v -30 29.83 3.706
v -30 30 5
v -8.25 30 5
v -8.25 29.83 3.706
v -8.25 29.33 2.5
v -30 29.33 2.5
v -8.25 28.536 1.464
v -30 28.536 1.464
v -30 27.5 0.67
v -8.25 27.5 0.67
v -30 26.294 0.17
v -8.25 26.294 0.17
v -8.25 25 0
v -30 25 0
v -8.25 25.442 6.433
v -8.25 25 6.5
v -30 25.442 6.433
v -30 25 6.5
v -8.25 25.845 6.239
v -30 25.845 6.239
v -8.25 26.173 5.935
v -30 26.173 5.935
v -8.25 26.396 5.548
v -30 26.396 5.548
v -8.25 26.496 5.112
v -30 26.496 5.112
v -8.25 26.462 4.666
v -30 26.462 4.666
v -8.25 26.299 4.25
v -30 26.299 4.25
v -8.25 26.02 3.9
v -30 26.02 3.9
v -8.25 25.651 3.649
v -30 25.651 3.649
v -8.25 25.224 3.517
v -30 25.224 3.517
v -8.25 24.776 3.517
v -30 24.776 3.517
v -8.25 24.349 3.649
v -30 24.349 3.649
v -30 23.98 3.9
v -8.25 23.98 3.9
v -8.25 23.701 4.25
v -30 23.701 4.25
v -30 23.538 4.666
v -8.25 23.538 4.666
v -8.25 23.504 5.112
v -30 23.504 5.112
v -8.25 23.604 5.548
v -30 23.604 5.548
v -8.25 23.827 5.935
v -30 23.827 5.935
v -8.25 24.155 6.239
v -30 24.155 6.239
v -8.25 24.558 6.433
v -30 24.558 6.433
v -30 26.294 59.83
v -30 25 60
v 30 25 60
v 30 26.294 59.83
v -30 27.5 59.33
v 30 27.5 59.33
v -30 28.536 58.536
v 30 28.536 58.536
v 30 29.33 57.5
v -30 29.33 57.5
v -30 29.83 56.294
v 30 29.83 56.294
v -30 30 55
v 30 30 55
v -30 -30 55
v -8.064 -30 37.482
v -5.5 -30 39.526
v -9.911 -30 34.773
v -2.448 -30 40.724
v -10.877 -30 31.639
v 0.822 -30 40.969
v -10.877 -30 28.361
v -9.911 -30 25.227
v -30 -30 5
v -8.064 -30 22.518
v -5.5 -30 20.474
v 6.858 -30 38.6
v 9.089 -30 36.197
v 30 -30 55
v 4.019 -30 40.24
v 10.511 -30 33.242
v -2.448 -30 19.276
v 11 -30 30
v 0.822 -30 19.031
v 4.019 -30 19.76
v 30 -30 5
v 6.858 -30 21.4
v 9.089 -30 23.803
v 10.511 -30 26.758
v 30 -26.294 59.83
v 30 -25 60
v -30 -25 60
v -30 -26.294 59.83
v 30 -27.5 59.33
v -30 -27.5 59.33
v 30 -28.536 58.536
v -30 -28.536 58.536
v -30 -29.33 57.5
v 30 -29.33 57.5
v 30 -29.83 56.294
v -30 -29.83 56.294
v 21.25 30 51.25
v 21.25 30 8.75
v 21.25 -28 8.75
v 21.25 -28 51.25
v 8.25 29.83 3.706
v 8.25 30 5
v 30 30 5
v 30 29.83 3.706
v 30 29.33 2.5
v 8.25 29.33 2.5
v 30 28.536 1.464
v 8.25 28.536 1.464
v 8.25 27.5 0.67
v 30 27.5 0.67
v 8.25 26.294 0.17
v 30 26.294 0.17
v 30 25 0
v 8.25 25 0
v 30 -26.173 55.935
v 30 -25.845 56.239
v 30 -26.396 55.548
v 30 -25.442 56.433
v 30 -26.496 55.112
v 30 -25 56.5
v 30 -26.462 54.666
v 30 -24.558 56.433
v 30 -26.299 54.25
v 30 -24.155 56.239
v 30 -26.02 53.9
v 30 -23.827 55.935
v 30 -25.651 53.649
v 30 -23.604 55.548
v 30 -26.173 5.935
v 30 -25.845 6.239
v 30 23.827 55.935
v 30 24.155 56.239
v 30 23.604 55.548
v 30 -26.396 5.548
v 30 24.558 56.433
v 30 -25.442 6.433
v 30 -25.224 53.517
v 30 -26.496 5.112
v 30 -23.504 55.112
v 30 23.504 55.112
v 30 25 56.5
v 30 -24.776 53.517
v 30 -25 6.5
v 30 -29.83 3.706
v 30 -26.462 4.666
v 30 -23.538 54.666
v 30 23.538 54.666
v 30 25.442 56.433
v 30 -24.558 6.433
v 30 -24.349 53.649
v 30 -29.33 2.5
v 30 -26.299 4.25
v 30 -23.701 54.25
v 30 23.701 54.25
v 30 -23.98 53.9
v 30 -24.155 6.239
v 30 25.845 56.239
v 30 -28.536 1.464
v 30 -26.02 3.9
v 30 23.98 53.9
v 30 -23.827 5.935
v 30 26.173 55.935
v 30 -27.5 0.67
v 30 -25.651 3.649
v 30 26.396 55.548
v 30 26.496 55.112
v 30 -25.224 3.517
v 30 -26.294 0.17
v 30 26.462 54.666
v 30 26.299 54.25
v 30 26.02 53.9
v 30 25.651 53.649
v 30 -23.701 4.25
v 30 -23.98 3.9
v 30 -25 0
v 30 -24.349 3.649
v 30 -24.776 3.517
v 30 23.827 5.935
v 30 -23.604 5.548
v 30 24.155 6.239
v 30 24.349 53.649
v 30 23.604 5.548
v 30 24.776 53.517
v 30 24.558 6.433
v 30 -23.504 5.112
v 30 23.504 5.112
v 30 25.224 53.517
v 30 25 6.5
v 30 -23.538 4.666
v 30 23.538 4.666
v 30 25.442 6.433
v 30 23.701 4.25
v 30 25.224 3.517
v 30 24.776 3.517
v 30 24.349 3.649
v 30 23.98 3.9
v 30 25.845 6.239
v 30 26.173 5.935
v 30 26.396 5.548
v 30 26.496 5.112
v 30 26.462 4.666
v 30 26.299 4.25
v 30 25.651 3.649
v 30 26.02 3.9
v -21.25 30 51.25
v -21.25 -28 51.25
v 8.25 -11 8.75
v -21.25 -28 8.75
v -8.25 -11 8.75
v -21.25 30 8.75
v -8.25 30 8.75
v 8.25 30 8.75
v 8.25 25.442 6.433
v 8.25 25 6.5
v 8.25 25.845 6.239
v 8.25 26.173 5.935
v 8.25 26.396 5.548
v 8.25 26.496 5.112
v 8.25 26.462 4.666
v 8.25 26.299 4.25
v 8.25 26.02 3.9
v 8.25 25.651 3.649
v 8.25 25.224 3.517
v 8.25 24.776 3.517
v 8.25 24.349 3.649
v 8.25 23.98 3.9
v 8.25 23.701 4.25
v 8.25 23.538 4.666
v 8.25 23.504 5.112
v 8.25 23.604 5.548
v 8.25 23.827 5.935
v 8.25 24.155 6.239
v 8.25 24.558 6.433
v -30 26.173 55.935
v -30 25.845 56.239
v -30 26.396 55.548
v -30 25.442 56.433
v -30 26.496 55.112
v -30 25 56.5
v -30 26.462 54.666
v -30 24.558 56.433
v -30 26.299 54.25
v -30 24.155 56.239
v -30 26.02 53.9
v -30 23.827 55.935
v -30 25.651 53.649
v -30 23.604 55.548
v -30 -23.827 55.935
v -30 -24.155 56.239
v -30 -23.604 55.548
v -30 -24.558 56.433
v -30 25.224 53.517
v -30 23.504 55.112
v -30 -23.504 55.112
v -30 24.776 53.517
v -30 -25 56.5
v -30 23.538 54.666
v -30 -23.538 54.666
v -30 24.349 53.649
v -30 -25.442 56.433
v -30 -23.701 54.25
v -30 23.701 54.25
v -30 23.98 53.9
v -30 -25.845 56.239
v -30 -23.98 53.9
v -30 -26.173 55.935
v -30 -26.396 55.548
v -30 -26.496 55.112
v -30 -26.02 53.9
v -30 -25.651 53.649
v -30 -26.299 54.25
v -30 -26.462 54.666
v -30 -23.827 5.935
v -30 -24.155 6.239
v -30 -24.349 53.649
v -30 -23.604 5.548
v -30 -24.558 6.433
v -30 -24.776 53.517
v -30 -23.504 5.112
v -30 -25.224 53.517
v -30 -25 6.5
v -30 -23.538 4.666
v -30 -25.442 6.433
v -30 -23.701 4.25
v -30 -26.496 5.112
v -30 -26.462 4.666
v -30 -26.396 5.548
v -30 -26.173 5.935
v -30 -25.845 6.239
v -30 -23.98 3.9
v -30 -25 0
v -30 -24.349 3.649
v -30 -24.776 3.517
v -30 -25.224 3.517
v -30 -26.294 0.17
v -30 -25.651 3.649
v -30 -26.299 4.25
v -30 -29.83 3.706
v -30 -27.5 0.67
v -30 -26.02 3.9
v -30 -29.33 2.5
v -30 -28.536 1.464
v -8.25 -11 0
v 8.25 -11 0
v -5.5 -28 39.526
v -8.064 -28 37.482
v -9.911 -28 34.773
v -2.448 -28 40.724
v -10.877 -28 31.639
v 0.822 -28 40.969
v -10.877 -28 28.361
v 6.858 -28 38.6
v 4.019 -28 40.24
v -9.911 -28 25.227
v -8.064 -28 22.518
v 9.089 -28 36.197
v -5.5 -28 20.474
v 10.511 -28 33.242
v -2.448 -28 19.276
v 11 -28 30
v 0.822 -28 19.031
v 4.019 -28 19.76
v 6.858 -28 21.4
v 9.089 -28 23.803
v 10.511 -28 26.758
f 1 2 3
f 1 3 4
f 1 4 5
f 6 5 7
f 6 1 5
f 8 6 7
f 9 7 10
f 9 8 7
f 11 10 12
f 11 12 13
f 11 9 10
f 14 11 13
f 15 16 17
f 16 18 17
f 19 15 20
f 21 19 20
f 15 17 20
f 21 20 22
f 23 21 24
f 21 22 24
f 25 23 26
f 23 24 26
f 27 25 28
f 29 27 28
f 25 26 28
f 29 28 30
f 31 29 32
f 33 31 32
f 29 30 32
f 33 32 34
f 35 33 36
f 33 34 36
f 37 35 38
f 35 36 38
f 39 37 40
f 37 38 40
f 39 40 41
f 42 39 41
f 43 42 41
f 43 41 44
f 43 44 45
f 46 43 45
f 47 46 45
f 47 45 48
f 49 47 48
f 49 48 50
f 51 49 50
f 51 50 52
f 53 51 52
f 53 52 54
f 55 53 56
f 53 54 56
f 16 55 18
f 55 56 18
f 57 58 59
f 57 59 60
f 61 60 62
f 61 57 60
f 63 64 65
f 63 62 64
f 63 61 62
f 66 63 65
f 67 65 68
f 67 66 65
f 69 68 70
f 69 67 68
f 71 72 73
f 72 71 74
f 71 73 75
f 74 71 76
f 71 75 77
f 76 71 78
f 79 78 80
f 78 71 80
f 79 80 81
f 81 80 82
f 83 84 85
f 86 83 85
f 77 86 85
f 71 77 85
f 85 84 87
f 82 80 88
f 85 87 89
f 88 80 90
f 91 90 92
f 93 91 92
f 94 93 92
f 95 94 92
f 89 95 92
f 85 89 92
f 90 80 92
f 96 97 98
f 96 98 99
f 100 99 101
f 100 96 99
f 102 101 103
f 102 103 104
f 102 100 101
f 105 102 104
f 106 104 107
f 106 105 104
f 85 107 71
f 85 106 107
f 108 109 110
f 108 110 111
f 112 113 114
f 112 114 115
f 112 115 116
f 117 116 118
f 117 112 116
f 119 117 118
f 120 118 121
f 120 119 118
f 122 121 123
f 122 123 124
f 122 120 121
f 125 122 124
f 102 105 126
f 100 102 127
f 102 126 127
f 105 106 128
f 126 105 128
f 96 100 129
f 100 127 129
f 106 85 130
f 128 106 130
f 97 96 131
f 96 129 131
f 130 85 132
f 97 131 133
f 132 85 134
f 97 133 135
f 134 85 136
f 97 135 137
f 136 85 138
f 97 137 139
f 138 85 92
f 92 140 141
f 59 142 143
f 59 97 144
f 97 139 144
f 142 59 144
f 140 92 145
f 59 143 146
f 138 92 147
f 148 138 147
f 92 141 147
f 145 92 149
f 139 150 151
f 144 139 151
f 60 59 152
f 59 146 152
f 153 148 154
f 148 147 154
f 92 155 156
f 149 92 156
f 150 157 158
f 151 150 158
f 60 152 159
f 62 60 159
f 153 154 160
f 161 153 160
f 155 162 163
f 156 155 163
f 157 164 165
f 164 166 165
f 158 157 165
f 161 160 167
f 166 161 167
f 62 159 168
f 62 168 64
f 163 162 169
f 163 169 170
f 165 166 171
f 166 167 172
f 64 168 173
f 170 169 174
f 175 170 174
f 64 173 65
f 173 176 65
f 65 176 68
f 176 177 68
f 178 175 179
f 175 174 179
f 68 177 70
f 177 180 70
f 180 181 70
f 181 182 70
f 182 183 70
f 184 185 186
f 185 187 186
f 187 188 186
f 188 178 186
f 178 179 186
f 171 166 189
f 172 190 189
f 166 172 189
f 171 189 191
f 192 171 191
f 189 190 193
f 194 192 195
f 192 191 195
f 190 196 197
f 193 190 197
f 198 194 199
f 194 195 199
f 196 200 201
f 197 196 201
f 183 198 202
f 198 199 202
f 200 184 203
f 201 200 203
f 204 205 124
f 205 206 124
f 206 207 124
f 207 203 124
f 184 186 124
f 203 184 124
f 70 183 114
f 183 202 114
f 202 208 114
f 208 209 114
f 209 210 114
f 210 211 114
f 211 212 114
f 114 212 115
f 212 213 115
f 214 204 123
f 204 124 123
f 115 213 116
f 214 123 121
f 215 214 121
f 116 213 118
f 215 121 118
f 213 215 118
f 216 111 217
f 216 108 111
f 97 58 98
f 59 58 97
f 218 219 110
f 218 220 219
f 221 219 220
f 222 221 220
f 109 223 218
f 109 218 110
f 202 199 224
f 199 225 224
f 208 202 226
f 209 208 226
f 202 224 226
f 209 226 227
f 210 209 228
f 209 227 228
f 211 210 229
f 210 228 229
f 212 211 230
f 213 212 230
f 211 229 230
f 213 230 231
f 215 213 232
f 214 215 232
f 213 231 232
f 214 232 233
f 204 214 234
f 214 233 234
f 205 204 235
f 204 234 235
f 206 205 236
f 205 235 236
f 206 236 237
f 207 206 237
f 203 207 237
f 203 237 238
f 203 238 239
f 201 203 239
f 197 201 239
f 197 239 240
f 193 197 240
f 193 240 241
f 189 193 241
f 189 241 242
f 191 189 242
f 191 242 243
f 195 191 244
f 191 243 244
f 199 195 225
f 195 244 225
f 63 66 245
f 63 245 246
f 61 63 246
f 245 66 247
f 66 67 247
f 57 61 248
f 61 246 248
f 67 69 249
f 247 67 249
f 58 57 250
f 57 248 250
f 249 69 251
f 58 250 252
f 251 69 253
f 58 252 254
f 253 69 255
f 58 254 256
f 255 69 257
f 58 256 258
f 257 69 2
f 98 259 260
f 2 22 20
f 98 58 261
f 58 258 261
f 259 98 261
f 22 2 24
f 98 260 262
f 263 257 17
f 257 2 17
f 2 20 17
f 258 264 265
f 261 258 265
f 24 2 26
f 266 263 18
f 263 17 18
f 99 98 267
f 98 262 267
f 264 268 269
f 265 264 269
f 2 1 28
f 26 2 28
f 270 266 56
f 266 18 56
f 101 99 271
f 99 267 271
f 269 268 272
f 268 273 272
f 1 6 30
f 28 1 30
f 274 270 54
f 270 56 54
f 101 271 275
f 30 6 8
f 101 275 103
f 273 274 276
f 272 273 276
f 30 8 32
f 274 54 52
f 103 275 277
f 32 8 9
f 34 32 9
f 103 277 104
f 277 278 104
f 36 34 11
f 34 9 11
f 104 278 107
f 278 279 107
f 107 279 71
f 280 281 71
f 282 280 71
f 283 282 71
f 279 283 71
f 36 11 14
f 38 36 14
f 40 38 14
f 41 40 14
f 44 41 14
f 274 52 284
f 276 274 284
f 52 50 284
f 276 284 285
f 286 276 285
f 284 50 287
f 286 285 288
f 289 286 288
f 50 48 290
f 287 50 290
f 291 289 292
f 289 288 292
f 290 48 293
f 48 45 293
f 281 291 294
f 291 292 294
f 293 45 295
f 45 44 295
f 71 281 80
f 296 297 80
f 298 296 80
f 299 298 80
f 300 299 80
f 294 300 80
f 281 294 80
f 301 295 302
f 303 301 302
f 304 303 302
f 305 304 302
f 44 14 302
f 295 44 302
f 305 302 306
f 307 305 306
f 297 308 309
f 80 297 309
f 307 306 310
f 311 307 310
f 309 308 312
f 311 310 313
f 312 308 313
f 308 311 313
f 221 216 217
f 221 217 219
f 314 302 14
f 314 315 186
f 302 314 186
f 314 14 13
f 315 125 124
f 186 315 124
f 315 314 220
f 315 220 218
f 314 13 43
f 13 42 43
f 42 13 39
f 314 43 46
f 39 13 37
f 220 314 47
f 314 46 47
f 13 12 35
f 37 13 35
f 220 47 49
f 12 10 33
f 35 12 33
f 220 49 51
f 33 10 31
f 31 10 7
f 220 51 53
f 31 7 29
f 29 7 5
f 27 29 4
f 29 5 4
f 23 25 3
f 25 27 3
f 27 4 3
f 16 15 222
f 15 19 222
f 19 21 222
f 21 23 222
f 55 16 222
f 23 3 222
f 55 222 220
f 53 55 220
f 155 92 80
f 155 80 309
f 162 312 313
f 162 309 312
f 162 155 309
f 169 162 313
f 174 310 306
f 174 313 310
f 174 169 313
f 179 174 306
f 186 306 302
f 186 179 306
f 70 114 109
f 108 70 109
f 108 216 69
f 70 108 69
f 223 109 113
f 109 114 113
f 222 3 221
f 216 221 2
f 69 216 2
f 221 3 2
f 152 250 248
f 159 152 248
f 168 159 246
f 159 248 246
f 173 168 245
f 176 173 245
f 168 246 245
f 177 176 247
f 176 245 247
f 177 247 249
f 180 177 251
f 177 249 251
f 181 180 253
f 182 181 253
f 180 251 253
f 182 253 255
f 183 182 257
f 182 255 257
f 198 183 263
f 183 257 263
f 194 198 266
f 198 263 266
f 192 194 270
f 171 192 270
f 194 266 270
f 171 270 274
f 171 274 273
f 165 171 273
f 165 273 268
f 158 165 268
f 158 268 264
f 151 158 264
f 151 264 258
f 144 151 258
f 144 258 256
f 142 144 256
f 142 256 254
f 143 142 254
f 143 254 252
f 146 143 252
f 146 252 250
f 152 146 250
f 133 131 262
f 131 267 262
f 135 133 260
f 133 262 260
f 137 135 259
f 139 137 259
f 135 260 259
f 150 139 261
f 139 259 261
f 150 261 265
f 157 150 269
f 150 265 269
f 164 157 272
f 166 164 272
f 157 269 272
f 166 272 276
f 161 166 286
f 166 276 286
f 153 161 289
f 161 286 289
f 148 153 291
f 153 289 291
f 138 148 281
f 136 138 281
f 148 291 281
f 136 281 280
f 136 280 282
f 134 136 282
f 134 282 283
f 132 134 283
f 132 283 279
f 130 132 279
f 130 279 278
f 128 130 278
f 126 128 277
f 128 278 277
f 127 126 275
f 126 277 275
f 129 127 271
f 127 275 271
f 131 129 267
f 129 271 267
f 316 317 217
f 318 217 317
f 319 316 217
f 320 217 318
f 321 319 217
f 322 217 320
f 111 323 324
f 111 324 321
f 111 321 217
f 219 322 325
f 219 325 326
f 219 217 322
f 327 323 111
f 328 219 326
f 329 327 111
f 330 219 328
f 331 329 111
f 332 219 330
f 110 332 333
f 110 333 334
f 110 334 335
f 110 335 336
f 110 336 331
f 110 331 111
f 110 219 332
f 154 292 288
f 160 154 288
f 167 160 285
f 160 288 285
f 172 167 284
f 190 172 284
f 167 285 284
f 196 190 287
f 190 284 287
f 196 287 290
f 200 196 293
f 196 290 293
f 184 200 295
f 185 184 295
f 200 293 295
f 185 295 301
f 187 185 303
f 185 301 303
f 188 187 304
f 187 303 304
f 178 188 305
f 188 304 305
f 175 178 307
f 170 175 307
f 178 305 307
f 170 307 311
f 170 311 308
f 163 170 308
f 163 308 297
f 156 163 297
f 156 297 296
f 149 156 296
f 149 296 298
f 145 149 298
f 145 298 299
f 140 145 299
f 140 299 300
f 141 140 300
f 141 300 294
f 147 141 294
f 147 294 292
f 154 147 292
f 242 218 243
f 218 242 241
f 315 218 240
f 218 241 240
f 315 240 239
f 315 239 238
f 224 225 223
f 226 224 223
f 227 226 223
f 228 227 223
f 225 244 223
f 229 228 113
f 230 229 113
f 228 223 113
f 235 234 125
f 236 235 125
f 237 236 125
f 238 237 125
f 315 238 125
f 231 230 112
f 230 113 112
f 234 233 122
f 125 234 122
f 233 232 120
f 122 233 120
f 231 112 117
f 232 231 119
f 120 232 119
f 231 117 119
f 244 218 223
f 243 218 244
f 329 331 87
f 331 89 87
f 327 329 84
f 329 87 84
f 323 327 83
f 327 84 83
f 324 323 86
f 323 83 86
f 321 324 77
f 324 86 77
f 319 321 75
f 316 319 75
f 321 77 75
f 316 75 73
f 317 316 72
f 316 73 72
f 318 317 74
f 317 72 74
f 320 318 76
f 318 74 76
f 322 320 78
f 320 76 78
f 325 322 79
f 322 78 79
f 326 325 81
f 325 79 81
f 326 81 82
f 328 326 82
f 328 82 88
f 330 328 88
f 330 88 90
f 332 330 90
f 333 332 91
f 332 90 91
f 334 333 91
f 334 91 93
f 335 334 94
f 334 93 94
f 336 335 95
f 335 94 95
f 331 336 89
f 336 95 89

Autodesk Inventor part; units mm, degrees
ref_plane "YZ Plane" through (0, 0, 0) normal (1, 0, 0) x (0, 1, 0)
ref_plane "XZ Plane" through (0, 0, 0) normal (0, 1, 0) x (-1, 0, 0)
ref_plane "XY Plane" through (0, 0, 0) normal (0, 0, 1) x (1, 0, 0)
sketch "Sketch1" plane through (0, 0, 0) normal (0, 0, 1) x (1, 0, 0)
  line L0 (-30, -30) -> (30, -30)
  line L1 (30, -30) -> (30, 30)
  line L2 (30, 30) -> (-30, 30)
  line L3 (-30, 30) -> (-30, -30)
  line L4 (-30, -30) -> (30, 30) construction
  line L5 (30, -30) -> (-30, 30) construction
  point P0 (0, 0)
  dimension "d0" = 60
  dimension "d1" = 60
extrude "Main Block" add sketch "Sketch1" along normal blind 60
sketch "Sketch2" plane through (-30, 30, 0) normal (0, 1, 0) x (1, 0, 0)
  line L0 (0, -60) -> (60, -60) construction
  line L1 (0, 0) -> (60, 0) construction
  line L2 (60, -60) -> (0, 0) construction
  line L3 (51.25, -51.25) -> (8.75, -51.25)
  line L4 (8.75, -51.25) -> (8.75, -8.75)
  line L5 (8.75, -8.75) -> (51.25, -8.75)
  line L6 (51.25, -8.75) -> (51.25, -51.25)
  line L7 (51.25, -51.25) -> (8.75, -8.75) construction
  line L8 (8.75, -51.25) -> (51.25, -8.75) construction
  line L9 (30, -30) -> (30, -51.25) construction
  point P0 (30, 0)
  dimension "d4" = 42.5
  dimension "d5" = 42.5
extrude "Motor Void" cut sketch "Sketch2" against normal blind 58
sketch "Sketch3" plane through (-30, 30, 0) normal (0, 1, 0) x (1, 0, 0)
  line L0 (30, 0) -> (30, -8.75) construction
  line L1 (8.75, -8.75) -> (51.25, -8.75) construction
  line L2 (38.25, 0.125) -> (21.75, 0.125)
  line L3 (21.75, 0.125) -> (21.75, -8.875)
  line L4 (21.75, -8.875) -> (38.25, -8.875)
  line L5 (38.25, -8.875) -> (38.25, 0.125)
  line L6 (38.25, 0.125) -> (21.75, -8.875) construction
  line L7 (21.75, 0.125) -> (38.25, -8.875) construction
  point P0 (30, -4.375)
  dimension "d30" = 16.5
  dimension "d31" = 9
extrude "Cable Void" cut sketch "Sketch3" against normal blind 41
sketch "Sketch4" plane through (-30, -30, 0) normal (0, -1, 0) x (1, 0, 0)
  line L0 (0, 0) -> (0, 60) construction
  line L1 (60, 60) -> (0, 60) construction
  line L2 (0, 0) -> (60, 60) construction
  circle A0 centre (30, 30) radius 11
  point P0 (30, 0)
  dimension "d12" = 22
extrude "Raised Void" cut sketch "Sketch4" against normal blind 2
sketch "Sketch6" plane through (-30, -30, 0) normal (-1, 0, 0) x (0, 0, 1)
  line L0 (60, 0) -> (60, 60) construction
  line L1 (60, 60) -> (60, 55) construction
  line L2 (60, 55) -> (55, 55) construction
  line L3 (60, 0) -> (60, 5) construction
  line L4 (60, 5) -> (55, 5) construction
  line L5 (0, 0) -> (5, 0) construction
  line L6 (0, 0) -> (60, 0) construction
  line L7 (5, 0) -> (5, 5) construction
  line L8 (0, 60) -> (0, 0) construction
  line L9 (0, 60) -> (5, 60) construction
  line L10 (0, 60) -> (60, 60) construction
  line L11 (5, 60) -> (5, 55) construction
  circle A0 centre (55, 55) radius 1.5
  circle A1 centre (55, 5) radius 1.5
  circle A2 centre (5, 5) radius 1.5
  circle A3 centre (5, 55) radius 1.5
  point P0 (0, 30)
  dimension "d32" = 5
  dimension "d33" = 5
  dimension "d34" = 5
  dimension "d35" = 5
  dimension "d36" = 5
  dimension "d37" = 5
  dimension "d38" = 5
  dimension "d39" = 5
  dimension "d40" = 3
  dimension "d41" = 3
  dimension "d42" = 3
  dimension "d43" = 3
extrude "Holes" cut sketch "Sketch6" against normal blind 60
fillet "Cleaning it up" radius 5 5 edges at (0, 30, 60) (0, -30, 60) (19.125, 30, 0) (-19.125, 30, 0) (0, -30, 0)
equation "\"d4\" = d5"
properties part number "60x60Motor"
